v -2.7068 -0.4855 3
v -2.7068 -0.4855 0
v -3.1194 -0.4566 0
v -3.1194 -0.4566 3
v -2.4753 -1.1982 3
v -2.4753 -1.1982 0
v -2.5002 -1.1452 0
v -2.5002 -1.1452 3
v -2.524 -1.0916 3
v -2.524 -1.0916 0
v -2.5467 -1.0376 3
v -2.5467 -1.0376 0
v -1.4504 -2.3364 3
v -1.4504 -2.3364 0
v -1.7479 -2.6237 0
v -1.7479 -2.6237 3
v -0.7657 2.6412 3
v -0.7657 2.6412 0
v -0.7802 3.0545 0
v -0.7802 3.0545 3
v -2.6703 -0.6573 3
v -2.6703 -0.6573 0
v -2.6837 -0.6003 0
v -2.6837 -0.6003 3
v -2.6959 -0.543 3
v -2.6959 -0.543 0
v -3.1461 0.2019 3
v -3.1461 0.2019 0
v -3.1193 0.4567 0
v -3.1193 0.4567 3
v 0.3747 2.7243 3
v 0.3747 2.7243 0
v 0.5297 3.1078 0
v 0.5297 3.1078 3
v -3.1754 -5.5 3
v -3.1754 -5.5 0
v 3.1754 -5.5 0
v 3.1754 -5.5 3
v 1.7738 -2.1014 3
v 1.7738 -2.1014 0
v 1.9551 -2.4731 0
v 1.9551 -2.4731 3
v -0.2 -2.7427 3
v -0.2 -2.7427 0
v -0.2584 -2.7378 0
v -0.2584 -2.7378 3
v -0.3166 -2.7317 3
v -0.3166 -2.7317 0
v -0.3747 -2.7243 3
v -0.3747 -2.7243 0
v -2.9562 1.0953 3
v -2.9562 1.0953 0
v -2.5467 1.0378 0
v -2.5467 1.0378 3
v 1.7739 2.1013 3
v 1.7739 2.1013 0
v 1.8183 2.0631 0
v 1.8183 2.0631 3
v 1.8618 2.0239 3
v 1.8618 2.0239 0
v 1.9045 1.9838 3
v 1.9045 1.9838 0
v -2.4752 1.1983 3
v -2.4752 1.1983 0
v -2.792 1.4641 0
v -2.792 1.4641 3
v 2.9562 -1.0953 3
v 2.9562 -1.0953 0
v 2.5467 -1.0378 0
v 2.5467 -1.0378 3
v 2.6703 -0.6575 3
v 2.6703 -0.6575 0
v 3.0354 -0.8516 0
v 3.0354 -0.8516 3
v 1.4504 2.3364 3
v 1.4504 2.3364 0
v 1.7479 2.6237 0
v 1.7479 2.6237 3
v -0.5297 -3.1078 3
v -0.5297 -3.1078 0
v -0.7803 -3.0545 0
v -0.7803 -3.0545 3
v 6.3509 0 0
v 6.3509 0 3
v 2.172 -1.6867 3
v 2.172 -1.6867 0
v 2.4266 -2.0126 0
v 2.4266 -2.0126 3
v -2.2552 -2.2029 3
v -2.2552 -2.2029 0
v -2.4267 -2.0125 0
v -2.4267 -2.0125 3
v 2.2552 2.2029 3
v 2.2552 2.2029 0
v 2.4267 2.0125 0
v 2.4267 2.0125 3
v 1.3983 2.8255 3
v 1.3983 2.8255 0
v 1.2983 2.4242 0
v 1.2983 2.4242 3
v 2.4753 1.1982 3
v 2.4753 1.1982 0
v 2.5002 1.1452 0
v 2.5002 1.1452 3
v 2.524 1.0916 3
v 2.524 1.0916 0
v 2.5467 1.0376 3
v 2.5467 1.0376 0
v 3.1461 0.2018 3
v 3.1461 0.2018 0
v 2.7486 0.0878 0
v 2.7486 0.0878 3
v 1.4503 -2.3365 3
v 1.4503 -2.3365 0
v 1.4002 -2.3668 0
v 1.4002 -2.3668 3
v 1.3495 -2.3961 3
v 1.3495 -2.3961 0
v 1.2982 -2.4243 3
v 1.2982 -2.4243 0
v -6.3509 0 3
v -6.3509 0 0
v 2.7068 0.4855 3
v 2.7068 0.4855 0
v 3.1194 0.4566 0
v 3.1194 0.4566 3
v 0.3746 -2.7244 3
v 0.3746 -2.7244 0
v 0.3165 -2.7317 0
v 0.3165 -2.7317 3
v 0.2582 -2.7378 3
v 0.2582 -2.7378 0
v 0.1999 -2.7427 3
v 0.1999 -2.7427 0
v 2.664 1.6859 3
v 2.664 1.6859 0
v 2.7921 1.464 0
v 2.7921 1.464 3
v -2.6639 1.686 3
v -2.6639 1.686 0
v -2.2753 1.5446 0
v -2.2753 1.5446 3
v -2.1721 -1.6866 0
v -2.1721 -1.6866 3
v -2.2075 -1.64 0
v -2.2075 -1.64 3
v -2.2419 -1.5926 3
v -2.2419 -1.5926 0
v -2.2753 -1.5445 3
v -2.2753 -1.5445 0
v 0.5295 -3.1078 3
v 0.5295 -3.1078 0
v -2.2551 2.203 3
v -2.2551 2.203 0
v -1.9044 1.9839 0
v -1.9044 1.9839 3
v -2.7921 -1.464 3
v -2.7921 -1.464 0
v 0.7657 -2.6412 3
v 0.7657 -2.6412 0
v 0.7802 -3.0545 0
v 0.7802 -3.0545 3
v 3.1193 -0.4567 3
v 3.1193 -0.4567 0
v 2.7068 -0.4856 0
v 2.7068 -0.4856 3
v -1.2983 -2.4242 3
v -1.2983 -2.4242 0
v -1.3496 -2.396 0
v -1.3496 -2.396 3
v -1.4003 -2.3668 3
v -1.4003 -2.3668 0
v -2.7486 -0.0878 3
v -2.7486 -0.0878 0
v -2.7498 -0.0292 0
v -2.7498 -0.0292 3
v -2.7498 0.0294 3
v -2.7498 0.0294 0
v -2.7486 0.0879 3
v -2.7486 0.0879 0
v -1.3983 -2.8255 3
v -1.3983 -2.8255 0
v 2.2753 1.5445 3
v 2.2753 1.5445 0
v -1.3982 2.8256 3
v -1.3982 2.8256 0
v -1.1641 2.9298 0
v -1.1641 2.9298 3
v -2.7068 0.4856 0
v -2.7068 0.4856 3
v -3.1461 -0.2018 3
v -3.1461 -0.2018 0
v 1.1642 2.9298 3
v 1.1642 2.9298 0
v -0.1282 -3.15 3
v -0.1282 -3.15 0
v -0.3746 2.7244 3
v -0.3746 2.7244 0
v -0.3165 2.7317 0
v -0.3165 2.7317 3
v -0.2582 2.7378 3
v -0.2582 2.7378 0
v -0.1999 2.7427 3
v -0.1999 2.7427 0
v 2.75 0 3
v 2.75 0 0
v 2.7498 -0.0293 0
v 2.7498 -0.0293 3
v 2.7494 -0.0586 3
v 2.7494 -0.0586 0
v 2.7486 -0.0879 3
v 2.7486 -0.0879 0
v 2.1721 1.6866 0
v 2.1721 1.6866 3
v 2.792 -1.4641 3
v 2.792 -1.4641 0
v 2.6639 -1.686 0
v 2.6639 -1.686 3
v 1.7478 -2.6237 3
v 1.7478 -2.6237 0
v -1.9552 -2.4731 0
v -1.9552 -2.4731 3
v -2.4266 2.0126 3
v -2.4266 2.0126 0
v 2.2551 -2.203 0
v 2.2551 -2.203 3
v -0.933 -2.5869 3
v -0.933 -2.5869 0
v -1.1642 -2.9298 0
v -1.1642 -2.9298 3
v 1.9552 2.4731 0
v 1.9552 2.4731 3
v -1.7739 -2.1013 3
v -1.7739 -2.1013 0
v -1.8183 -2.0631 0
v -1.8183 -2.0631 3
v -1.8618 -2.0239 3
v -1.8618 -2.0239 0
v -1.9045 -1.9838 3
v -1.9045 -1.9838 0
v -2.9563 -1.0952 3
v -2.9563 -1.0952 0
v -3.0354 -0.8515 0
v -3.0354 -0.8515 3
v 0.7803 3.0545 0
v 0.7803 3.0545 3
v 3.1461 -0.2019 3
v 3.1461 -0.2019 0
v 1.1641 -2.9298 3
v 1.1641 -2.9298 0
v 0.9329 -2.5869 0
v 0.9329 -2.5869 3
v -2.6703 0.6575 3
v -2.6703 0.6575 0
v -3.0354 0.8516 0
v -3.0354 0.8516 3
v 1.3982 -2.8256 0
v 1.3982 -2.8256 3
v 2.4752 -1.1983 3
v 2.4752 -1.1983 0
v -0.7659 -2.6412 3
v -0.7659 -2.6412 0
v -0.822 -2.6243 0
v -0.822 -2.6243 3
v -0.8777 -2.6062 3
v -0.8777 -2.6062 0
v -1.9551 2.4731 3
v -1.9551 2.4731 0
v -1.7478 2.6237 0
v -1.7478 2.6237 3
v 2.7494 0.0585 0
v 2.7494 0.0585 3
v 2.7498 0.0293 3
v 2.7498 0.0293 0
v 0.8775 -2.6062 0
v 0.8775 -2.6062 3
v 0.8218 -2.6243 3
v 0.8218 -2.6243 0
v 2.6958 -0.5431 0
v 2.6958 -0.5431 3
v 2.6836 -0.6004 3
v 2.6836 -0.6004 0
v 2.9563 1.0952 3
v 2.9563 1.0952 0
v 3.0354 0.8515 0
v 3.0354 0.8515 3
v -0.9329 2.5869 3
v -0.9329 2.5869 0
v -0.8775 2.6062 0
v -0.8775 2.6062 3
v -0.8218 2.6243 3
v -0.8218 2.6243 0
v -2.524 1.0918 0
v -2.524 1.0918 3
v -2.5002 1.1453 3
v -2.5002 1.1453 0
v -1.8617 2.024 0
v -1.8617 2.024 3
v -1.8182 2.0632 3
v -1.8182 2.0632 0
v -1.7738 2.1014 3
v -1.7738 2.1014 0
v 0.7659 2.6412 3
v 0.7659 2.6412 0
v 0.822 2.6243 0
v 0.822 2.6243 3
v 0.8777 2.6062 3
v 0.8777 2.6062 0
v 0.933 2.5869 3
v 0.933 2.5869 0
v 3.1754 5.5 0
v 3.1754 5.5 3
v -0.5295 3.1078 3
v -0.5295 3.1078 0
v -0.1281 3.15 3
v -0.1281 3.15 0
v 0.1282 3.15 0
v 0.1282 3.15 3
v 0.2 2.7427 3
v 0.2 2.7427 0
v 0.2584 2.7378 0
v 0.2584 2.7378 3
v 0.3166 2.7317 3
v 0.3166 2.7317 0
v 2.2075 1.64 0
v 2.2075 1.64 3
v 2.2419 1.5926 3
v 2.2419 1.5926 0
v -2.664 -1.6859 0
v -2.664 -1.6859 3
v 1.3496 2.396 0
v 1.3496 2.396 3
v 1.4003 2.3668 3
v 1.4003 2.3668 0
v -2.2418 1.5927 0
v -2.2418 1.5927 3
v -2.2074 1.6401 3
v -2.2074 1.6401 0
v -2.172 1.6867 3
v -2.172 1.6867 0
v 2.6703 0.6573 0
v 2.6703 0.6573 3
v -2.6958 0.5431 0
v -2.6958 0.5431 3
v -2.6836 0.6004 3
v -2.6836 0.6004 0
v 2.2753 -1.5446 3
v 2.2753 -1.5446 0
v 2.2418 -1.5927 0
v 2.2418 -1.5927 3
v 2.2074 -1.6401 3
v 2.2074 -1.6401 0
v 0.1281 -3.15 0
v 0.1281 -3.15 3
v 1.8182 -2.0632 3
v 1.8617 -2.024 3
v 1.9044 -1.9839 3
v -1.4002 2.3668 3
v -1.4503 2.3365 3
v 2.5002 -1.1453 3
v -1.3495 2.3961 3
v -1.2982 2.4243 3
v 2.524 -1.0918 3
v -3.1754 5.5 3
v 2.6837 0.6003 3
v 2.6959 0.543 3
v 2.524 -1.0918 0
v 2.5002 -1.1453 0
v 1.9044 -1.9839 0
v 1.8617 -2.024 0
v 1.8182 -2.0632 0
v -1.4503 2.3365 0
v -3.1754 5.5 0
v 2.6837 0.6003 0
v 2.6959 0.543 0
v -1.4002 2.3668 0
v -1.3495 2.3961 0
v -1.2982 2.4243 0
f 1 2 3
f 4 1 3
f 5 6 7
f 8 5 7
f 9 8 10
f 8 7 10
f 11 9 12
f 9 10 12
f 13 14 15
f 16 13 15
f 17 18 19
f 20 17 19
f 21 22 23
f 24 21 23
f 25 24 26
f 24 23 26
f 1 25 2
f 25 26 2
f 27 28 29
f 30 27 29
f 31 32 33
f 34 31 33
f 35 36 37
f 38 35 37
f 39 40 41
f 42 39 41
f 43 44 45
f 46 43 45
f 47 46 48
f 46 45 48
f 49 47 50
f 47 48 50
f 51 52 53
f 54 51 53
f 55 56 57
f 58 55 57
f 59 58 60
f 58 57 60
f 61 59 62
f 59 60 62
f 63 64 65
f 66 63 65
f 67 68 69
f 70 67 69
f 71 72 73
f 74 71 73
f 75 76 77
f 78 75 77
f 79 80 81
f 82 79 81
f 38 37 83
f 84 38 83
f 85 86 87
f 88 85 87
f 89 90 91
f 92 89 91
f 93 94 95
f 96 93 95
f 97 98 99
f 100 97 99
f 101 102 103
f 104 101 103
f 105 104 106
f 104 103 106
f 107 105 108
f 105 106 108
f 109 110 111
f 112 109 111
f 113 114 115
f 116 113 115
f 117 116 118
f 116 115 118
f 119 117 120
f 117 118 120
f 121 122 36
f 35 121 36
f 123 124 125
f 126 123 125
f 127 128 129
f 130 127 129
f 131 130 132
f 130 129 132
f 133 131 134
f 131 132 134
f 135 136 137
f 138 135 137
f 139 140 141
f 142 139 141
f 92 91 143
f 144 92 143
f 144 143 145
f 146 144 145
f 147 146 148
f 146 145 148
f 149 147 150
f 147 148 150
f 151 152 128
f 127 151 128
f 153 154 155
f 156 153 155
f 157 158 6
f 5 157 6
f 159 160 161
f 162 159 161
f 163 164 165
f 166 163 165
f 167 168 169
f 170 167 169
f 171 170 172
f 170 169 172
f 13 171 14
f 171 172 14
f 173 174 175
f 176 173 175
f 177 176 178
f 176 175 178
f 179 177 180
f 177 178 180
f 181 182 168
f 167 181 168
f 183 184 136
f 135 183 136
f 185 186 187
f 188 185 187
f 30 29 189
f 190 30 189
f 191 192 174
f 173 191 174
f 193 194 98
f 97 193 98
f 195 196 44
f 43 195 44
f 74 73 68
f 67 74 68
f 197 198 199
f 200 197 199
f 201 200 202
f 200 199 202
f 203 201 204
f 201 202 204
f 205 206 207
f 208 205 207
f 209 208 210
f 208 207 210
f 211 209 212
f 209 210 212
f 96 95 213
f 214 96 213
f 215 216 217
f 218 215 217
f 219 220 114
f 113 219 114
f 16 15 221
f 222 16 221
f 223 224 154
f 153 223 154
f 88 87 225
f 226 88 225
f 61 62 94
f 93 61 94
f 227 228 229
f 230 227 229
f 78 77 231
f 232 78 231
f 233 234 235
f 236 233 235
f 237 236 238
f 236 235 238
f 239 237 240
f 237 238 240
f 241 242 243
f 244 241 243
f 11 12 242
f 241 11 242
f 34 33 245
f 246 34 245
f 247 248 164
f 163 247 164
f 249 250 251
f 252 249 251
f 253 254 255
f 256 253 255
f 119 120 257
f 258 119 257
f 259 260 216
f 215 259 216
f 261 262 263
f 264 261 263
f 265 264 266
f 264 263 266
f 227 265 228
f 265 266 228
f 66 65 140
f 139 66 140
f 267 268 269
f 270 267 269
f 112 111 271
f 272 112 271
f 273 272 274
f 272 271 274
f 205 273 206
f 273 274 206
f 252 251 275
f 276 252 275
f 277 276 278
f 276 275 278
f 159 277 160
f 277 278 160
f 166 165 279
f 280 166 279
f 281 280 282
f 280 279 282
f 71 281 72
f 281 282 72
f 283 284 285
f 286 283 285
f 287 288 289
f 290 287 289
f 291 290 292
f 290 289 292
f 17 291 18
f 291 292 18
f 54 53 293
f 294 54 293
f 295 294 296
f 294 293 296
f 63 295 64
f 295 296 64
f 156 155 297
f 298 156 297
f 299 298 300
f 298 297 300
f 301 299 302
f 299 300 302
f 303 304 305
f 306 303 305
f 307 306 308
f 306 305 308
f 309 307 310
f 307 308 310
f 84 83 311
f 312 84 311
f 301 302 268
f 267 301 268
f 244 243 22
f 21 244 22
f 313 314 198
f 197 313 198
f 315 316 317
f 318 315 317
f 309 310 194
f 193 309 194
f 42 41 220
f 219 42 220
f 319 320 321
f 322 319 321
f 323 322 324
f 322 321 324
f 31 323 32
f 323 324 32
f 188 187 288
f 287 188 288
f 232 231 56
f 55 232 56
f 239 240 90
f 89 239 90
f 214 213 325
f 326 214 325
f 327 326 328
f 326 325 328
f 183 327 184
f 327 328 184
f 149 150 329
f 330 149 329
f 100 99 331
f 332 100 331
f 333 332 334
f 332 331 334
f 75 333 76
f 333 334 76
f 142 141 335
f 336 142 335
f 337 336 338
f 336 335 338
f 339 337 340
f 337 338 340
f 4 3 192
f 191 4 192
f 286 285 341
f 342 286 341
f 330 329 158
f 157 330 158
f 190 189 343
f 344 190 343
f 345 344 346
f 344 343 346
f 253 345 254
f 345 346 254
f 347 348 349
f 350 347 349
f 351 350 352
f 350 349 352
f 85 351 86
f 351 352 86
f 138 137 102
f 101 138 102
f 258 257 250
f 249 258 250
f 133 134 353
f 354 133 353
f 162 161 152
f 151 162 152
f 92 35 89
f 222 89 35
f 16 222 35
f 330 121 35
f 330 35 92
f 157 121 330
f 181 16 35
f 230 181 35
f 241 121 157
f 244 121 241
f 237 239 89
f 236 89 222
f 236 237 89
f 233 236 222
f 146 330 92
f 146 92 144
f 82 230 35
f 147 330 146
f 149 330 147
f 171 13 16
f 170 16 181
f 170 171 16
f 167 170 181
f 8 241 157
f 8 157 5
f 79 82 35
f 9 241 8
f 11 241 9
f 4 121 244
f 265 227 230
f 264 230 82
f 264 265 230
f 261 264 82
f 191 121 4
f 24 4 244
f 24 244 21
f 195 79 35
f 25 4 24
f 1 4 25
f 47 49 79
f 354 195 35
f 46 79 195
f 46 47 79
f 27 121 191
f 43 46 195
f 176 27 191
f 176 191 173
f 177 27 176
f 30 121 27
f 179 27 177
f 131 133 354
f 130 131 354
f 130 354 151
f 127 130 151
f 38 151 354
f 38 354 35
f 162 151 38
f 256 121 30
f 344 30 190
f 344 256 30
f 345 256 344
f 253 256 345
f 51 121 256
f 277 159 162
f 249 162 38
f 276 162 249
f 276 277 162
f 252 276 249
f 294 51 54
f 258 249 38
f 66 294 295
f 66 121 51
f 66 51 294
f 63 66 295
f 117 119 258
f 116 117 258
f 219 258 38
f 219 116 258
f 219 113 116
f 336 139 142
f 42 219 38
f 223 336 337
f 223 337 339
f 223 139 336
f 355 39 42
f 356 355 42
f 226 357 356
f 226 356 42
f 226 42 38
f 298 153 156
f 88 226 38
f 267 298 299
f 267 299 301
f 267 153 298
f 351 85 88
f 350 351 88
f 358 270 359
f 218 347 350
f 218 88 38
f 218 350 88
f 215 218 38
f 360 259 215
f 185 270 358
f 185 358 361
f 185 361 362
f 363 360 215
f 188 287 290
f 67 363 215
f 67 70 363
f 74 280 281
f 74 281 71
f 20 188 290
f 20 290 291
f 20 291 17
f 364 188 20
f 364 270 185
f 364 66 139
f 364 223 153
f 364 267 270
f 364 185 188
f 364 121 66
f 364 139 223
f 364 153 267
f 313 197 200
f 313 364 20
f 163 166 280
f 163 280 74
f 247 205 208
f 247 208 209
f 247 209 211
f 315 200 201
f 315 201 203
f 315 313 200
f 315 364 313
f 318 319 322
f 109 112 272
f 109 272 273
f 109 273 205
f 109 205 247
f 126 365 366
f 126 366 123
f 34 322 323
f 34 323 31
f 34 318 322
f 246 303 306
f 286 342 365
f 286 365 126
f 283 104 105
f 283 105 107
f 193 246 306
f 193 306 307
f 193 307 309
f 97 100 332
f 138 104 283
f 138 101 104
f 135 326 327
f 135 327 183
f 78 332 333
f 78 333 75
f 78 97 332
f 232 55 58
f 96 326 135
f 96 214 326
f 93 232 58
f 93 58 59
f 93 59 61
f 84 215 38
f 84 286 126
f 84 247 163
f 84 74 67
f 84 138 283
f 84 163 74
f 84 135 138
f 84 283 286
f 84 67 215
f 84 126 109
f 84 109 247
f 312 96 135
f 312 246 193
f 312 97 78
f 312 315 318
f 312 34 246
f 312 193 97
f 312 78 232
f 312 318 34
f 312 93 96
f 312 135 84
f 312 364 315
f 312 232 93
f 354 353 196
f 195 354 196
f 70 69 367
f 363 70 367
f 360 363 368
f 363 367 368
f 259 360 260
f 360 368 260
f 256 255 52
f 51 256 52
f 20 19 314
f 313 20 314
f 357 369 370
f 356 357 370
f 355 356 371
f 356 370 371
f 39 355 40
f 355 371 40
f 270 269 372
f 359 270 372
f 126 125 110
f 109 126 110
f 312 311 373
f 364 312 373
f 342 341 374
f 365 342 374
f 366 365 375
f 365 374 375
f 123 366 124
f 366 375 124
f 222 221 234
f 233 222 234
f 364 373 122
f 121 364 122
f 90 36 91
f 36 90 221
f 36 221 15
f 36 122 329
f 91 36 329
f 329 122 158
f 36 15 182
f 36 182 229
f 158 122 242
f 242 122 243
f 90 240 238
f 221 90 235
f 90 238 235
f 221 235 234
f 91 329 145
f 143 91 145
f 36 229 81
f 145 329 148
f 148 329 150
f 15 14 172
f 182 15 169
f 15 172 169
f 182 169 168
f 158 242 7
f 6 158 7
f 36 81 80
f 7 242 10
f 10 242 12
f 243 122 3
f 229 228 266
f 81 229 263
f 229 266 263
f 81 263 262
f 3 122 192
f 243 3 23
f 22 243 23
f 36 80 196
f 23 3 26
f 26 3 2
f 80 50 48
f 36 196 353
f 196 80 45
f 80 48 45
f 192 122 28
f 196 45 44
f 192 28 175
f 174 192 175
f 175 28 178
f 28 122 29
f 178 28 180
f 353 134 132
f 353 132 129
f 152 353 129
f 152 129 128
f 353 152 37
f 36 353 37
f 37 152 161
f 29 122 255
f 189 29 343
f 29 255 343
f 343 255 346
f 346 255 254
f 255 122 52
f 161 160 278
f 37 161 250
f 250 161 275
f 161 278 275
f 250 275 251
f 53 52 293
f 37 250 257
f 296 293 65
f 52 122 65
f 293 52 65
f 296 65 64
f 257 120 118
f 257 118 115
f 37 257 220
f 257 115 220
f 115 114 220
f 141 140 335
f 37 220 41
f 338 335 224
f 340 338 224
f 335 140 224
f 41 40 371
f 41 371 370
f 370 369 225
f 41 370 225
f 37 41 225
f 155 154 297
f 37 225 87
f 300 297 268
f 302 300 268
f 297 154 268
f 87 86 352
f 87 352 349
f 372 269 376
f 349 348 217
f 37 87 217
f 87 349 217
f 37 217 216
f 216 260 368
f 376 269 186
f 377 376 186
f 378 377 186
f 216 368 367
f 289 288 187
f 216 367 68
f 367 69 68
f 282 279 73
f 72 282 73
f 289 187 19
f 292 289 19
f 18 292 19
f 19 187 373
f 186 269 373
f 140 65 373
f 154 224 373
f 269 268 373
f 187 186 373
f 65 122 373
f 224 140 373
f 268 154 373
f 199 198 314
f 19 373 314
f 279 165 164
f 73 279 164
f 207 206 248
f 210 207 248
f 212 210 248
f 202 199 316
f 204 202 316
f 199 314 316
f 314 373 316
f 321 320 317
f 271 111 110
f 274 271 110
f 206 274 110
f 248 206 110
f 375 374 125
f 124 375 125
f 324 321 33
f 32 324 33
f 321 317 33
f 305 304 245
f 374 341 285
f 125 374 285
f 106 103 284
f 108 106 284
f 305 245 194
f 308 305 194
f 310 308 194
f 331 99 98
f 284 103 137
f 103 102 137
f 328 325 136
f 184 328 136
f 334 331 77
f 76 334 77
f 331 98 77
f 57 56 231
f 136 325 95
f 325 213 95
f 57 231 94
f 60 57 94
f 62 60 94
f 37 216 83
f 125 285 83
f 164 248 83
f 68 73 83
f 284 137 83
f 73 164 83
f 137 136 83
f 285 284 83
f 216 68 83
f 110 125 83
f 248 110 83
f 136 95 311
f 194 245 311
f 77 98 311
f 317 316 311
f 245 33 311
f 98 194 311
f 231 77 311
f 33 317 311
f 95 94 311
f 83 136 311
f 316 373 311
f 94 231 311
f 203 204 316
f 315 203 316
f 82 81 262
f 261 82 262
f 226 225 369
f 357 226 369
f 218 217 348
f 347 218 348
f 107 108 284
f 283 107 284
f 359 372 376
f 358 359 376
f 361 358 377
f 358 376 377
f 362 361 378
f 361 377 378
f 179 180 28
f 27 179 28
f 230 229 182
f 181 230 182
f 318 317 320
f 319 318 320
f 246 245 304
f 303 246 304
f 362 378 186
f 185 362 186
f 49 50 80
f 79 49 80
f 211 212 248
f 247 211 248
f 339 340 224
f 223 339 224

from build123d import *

# Parameters (mm, degrees)
F1_DEPTH = 3


with BuildPart() as f1:
    # F0 (on Top) → F1 (new body)
    with BuildSketch(Plane.XY):
        Polygon((3.175426, 5.5), (-3.175426, 5.5), (-6.350853, 0), (-3.175426, -5.5), (3.175426, -5.5), (6.350853, 0), align=None)
        with BuildLine():
            ThreePointArc((2.748598, 0.087788), (2.74965, 0.043899), (2.75, 0))
            ThreePointArc((2.75, 0), (2.749649, -0.043966), (2.748594, -0.08792))
            Line((2.748594, -0.08792), (3.146129, -0.201912))
            Line((3.146129, -0.201912), (3.119345, -0.456748))
            Line((3.119345, -0.456748), (2.706787, -0.485596))
            ThreePointArc((2.706787, -0.485596), (2.689892, -0.571822), (2.670251, -0.657464))
            Line((2.670251, -0.657464), (3.035399, -0.851616))
            Line((3.035399, -0.851616), (2.956217, -1.095315))
            Line((2.956217, -1.095315), (2.546676, -1.037758))
            ThreePointArc((2.546676, -1.037758), (2.512223, -1.118586), (2.475205, -1.198273))
            Line((2.475205, -1.198273), (2.792007, -1.464102))
            Line((2.792007, -1.464102), (2.663887, -1.686012))
            Line((2.663887, -1.686012), (2.275263, -1.544564))
            ThreePointArc((2.275263, -1.544564), (2.224758, -1.616463), (2.171981, -1.686712))
            Line((2.171981, -1.686712), (2.426591, -2.012598))
            Line((2.426591, -2.012598), (2.255134, -2.203022))
            Line((2.255134, -2.203022), (1.90441, -1.983865))
            ThreePointArc((1.90441, -1.983865), (1.84006, -2.043693), (1.773831, -2.101434))
            Line((1.773831, -2.101434), (1.955122, -2.473135))
            Line((1.955122, -2.473135), (1.74782, -2.623749))
            Line((1.74782, -2.623749), (1.450326, -2.336462))
            ThreePointArc((1.450326, -2.336462), (1.374943, -2.381603), (1.298156, -2.424313))
            Line((1.298156, -2.424313), (1.398204, -2.825584))
            Line((1.398204, -2.825584), (1.164117, -2.929806))
            Line((1.164117, -2.929806), (0.932855, -2.586945))
            ThreePointArc((0.932855, -2.586945), (0.849734, -2.615426), (0.765745, -2.641237))
            Line((0.765745, -2.641237), (0.780178, -3.054541))
            Line((0.780178, -3.054541), (0.529538, -3.107816))
            Line((0.529538, -3.107816), (0.374614, -2.724365))
            ThreePointArc((0.374614, -2.724365), (0.287387, -2.734942), (0.199868, -2.742727))
            Line((0.199868, -2.742727), (0.128055, -3.15))
            Line((0.128055, -3.15), (-0.128185, -3.15))
            Line((-0.128185, -3.15), (-0.2, -2.742718))
            ThreePointArc((-0.2, -2.742718), (-0.287519, -2.734928), (-0.374745, -2.724347))
            Line((-0.374745, -2.724347), (-0.529666, -3.107789))
            Line((-0.529666, -3.107789), (-0.780306, -3.054514))
            Line((-0.780306, -3.054514), (-0.765873, -2.6412))
            ThreePointArc((-0.765873, -2.6412), (-0.84986, -2.615385), (-0.932979, -2.5869))
            Line((-0.932979, -2.5869), (-1.164237, -2.929753))
            Line((-1.164237, -2.929753), (-1.398323, -2.825531))
            Line((-1.398323, -2.825531), (-1.298273, -2.42425))
            ThreePointArc((-1.298273, -2.42425), (-1.375057, -2.381537), (-1.450438, -2.336392))
            Line((-1.450438, -2.336392), (-1.747925, -2.623672))
            Line((-1.747925, -2.623672), (-1.955227, -2.473058))
            Line((-1.955227, -2.473058), (-1.773932, -2.101348))
            ThreePointArc((-1.773932, -2.101348), (-1.840158, -2.043604), (-1.904506, -1.983773))
            Line((-1.904506, -1.983773), (-2.255221, -2.202924))
            Line((-2.255221, -2.202924), (-2.426679, -2.012501))
            Line((-2.426679, -2.012501), (-2.172063, -1.686607))
            ThreePointArc((-2.172063, -1.686607), (-2.224836, -1.616356), (-2.275338, -1.544454))
            Line((-2.275338, -1.544454), (-2.663953, -1.685898))
            Line((-2.663953, -1.685898), (-2.792073, -1.463988))
            Line((-2.792073, -1.463988), (-2.475263, -1.198154))
            ThreePointArc((-2.475263, -1.198154), (-2.512277, -1.118465), (-2.546726, -1.037635))
            Line((-2.546726, -1.037635), (-2.956257, -1.095191))
            Line((-2.956257, -1.095191), (-3.035439, -0.851492))
            Line((-3.035439, -0.851492), (-2.670283, -0.657335))
            ThreePointArc((-2.670283, -0.657335), (-2.68992, -0.571692), (-2.70681, -0.485466))
            Line((-2.70681, -0.485466), (-3.119359, -0.456618))
            Line((-3.119359, -0.456618), (-3.146143, -0.201782))
            Line((-3.146143, -0.201782), (-2.748598, -0.087788))
            ThreePointArc((-2.748598, -0.087788), (-2.75, 6.6e-05), (-2.748594, 0.08792))
            Line((-2.748594, 0.08792), (-3.146129, 0.201912))
            Line((-3.146129, 0.201912), (-3.119345, 0.456748))
            Line((-3.119345, 0.456748), (-2.706787, 0.485596))
            ThreePointArc((-2.706787, 0.485596), (-2.689892, 0.571822), (-2.670251, 0.657464))
            Line((-2.670251, 0.657464), (-3.035399, 0.851616))
            Line((-3.035399, 0.851616), (-2.956217, 1.095315))
            Line((-2.956217, 1.095315), (-2.546676, 1.037758))
            ThreePointArc((-2.546676, 1.037758), (-2.512223, 1.118586), (-2.475205, 1.198273))
            Line((-2.475205, 1.198273), (-2.792007, 1.464102))
            Line((-2.792007, 1.464102), (-2.663887, 1.686012))
            Line((-2.663887, 1.686012), (-2.275263, 1.544564))
            ThreePointArc((-2.275263, 1.544564), (-2.224758, 1.616463), (-2.171981, 1.686712))
            Line((-2.171981, 1.686712), (-2.426591, 2.012598))
            Line((-2.426591, 2.012598), (-2.255134, 2.203022))
            Line((-2.255134, 2.203022), (-1.90441, 1.983865))
            ThreePointArc((-1.90441, 1.983865), (-1.84006, 2.043693), (-1.773831, 2.101434))
            Line((-1.773831, 2.101434), (-1.955122, 2.473135))
            Line((-1.955122, 2.473135), (-1.74782, 2.623749))
            Line((-1.74782, 2.623749), (-1.450326, 2.336462))
            ThreePointArc((-1.450326, 2.336462), (-1.374943, 2.381603), (-1.298156, 2.424313))
            Line((-1.298156, 2.424313), (-1.398204, 2.825584))
            Line((-1.398204, 2.825584), (-1.164117, 2.929806))
            Line((-1.164117, 2.929806), (-0.932855, 2.586945))
            ThreePointArc((-0.932855, 2.586945), (-0.849734, 2.615426), (-0.765745, 2.641237))
            Line((-0.765745, 2.641237), (-0.780178, 3.054541))
            Line((-0.780178, 3.054541), (-0.529538, 3.107816))
            Line((-0.529538, 3.107816), (-0.374614, 2.724365))
            ThreePointArc((-0.374614, 2.724365), (-0.287387, 2.734942), (-0.199868, 2.742727))
            Line((-0.199868, 2.742727), (-0.128055, 3.15))
            Line((-0.128055, 3.15), (0.128185, 3.15))
            Line((0.128185, 3.15), (0.2, 2.742718))
            ThreePointArc((0.2, 2.742718), (0.287519, 2.734928), (0.374745, 2.724347))
            Line((0.374745, 2.724347), (0.529666, 3.107789))
            Line((0.529666, 3.107789), (0.780306, 3.054514))
            Line((0.780306, 3.054514), (0.765873, 2.6412))
            ThreePointArc((0.765873, 2.6412), (0.84986, 2.615385), (0.932979, 2.5869))
            Line((0.932979, 2.5869), (1.164237, 2.929753))
            Line((1.164237, 2.929753), (1.398323, 2.825531))
            Line((1.398323, 2.825531), (1.298273, 2.42425))
            ThreePointArc((1.298273, 2.42425), (1.375057, 2.381537), (1.450438, 2.336392))
            Line((1.450438, 2.336392), (1.747925, 2.623672))
            Line((1.747925, 2.623672), (1.955227, 2.473058))
            Line((1.955227, 2.473058), (1.773932, 2.101348))
            ThreePointArc((1.773932, 2.101348), (1.840158, 2.043604), (1.904506, 1.983773))
            Line((1.904506, 1.983773), (2.255221, 2.202924))
            Line((2.255221, 2.202924), (2.426679, 2.012501))
            Line((2.426679, 2.012501), (2.172063, 1.686607))
            ThreePointArc((2.172063, 1.686607), (2.224836, 1.616356), (2.275338, 1.544454))
            Line((2.275338, 1.544454), (2.663953, 1.685898))
            Line((2.663953, 1.685898), (2.792073, 1.463988))
            Line((2.792073, 1.463988), (2.475263, 1.198154))
            ThreePointArc((2.475263, 1.198154), (2.512277, 1.118465), (2.546726, 1.037635))
            Line((2.546726, 1.037635), (2.956257, 1.095191))
            Line((2.956257, 1.095191), (3.035439, 0.851492))
            Line((3.035439, 0.851492), (2.670283, 0.657335))
            ThreePointArc((2.670283, 0.657335), (2.68992, 0.571692), (2.70681, 0.485466))
            Line((2.70681, 0.485466), (3.119359, 0.456618))
            Line((3.119359, 0.456618), (3.146143, 0.201782))
            Line((3.146143, 0.201782), (2.748598, 0.087788))
        make_face(mode=Mode.SUBTRACT)
    extrude(amount=F1_DEPTH)


solid = f1.part
